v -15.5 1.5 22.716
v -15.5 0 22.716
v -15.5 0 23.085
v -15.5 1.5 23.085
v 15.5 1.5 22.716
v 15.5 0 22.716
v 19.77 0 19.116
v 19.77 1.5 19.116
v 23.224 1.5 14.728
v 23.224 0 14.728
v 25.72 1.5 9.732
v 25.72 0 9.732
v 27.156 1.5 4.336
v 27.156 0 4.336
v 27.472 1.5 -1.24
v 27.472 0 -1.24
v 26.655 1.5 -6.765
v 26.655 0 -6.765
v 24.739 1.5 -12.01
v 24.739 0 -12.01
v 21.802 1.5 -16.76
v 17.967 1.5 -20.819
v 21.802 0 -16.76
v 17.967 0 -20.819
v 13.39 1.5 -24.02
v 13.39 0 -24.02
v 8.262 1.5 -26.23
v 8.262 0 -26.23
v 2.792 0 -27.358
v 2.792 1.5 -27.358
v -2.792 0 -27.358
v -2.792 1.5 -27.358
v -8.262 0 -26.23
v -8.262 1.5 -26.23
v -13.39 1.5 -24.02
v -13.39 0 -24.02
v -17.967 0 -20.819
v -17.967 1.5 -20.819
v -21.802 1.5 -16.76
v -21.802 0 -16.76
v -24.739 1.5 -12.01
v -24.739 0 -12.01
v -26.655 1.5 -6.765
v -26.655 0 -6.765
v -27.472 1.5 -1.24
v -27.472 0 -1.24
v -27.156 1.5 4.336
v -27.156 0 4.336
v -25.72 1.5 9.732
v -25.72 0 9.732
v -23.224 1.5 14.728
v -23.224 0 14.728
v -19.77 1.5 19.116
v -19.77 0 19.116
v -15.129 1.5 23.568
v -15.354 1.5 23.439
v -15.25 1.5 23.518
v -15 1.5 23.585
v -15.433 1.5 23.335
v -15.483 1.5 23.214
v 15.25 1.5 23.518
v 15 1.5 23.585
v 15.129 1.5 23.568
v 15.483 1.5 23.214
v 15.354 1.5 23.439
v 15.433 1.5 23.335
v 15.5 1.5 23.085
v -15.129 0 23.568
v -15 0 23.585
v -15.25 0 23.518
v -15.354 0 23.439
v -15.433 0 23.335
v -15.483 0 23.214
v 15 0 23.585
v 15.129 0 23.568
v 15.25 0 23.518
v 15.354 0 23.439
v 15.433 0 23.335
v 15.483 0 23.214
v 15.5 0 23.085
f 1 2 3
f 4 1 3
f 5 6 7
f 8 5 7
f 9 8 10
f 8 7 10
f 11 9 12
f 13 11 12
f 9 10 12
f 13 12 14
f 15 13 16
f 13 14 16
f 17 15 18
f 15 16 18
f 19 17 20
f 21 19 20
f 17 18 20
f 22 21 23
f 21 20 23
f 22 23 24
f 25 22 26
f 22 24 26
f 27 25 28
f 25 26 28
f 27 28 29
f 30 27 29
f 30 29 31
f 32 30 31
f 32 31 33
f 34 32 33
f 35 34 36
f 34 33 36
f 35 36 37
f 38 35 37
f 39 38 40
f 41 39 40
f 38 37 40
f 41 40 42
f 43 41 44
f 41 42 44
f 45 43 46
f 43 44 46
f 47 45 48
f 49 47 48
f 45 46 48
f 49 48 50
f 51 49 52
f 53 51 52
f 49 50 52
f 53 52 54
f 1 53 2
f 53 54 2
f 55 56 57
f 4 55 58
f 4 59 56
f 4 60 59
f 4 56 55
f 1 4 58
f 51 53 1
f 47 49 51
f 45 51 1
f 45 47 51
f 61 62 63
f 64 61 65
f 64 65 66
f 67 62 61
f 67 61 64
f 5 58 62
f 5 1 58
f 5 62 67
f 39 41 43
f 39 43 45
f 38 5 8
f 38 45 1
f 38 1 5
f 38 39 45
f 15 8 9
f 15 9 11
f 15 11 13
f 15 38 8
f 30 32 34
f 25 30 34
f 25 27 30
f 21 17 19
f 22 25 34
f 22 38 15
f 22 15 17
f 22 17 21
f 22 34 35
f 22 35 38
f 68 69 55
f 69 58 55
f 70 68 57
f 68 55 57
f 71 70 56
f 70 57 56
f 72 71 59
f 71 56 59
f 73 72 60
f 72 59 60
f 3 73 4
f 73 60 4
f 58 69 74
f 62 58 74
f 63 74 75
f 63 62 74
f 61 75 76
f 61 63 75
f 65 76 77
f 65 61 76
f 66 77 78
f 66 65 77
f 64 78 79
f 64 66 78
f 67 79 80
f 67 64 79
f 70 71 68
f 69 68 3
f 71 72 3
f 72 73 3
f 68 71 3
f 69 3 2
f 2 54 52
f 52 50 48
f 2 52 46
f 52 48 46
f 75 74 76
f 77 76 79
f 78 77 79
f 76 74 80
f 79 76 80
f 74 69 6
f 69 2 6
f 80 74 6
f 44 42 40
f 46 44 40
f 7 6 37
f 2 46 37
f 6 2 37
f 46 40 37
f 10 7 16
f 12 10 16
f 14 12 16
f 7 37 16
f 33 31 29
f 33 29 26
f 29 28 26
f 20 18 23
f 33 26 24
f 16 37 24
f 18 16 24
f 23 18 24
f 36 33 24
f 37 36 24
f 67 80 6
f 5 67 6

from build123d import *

# Parameters (mm, degrees)
BOSS_EXTRUDE1_DEPTH = 1.5
FILLET1_R           = 0.5


with BuildPart() as part:
    # Sketch1 → Boss-Extrude1 (new body)
    with BuildSketch(Plane(origin=(0, 0, 0), x_dir=(1, 0, 0), z_dir=(0, 1, 0))):
        with BuildLine():
            Line((-15.5, -23.58495283), (15.5, -23.58495283))
            Line((15.5, -23.58495283), (15.5, -22.715633383))
            ThreePointArc((15.5, -22.715633383), (0, 27.5), (-15.5, -22.715633383))
            Line((-15.5, -22.715633383), (-15.5, -23.58495283))
        make_face()
    extrude(amount=BOSS_EXTRUDE1_DEPTH)

    # Fillet1
    fillet1_edges = [part.edges().sort_by_distance(p)[0] for p in [
        (15.5, 0.75, 23.58495283),
        (-15.5, 0.75, 23.58495283),
    ]]
    fillet(fillet1_edges, radius=FILLET1_R)


solid = part.part
